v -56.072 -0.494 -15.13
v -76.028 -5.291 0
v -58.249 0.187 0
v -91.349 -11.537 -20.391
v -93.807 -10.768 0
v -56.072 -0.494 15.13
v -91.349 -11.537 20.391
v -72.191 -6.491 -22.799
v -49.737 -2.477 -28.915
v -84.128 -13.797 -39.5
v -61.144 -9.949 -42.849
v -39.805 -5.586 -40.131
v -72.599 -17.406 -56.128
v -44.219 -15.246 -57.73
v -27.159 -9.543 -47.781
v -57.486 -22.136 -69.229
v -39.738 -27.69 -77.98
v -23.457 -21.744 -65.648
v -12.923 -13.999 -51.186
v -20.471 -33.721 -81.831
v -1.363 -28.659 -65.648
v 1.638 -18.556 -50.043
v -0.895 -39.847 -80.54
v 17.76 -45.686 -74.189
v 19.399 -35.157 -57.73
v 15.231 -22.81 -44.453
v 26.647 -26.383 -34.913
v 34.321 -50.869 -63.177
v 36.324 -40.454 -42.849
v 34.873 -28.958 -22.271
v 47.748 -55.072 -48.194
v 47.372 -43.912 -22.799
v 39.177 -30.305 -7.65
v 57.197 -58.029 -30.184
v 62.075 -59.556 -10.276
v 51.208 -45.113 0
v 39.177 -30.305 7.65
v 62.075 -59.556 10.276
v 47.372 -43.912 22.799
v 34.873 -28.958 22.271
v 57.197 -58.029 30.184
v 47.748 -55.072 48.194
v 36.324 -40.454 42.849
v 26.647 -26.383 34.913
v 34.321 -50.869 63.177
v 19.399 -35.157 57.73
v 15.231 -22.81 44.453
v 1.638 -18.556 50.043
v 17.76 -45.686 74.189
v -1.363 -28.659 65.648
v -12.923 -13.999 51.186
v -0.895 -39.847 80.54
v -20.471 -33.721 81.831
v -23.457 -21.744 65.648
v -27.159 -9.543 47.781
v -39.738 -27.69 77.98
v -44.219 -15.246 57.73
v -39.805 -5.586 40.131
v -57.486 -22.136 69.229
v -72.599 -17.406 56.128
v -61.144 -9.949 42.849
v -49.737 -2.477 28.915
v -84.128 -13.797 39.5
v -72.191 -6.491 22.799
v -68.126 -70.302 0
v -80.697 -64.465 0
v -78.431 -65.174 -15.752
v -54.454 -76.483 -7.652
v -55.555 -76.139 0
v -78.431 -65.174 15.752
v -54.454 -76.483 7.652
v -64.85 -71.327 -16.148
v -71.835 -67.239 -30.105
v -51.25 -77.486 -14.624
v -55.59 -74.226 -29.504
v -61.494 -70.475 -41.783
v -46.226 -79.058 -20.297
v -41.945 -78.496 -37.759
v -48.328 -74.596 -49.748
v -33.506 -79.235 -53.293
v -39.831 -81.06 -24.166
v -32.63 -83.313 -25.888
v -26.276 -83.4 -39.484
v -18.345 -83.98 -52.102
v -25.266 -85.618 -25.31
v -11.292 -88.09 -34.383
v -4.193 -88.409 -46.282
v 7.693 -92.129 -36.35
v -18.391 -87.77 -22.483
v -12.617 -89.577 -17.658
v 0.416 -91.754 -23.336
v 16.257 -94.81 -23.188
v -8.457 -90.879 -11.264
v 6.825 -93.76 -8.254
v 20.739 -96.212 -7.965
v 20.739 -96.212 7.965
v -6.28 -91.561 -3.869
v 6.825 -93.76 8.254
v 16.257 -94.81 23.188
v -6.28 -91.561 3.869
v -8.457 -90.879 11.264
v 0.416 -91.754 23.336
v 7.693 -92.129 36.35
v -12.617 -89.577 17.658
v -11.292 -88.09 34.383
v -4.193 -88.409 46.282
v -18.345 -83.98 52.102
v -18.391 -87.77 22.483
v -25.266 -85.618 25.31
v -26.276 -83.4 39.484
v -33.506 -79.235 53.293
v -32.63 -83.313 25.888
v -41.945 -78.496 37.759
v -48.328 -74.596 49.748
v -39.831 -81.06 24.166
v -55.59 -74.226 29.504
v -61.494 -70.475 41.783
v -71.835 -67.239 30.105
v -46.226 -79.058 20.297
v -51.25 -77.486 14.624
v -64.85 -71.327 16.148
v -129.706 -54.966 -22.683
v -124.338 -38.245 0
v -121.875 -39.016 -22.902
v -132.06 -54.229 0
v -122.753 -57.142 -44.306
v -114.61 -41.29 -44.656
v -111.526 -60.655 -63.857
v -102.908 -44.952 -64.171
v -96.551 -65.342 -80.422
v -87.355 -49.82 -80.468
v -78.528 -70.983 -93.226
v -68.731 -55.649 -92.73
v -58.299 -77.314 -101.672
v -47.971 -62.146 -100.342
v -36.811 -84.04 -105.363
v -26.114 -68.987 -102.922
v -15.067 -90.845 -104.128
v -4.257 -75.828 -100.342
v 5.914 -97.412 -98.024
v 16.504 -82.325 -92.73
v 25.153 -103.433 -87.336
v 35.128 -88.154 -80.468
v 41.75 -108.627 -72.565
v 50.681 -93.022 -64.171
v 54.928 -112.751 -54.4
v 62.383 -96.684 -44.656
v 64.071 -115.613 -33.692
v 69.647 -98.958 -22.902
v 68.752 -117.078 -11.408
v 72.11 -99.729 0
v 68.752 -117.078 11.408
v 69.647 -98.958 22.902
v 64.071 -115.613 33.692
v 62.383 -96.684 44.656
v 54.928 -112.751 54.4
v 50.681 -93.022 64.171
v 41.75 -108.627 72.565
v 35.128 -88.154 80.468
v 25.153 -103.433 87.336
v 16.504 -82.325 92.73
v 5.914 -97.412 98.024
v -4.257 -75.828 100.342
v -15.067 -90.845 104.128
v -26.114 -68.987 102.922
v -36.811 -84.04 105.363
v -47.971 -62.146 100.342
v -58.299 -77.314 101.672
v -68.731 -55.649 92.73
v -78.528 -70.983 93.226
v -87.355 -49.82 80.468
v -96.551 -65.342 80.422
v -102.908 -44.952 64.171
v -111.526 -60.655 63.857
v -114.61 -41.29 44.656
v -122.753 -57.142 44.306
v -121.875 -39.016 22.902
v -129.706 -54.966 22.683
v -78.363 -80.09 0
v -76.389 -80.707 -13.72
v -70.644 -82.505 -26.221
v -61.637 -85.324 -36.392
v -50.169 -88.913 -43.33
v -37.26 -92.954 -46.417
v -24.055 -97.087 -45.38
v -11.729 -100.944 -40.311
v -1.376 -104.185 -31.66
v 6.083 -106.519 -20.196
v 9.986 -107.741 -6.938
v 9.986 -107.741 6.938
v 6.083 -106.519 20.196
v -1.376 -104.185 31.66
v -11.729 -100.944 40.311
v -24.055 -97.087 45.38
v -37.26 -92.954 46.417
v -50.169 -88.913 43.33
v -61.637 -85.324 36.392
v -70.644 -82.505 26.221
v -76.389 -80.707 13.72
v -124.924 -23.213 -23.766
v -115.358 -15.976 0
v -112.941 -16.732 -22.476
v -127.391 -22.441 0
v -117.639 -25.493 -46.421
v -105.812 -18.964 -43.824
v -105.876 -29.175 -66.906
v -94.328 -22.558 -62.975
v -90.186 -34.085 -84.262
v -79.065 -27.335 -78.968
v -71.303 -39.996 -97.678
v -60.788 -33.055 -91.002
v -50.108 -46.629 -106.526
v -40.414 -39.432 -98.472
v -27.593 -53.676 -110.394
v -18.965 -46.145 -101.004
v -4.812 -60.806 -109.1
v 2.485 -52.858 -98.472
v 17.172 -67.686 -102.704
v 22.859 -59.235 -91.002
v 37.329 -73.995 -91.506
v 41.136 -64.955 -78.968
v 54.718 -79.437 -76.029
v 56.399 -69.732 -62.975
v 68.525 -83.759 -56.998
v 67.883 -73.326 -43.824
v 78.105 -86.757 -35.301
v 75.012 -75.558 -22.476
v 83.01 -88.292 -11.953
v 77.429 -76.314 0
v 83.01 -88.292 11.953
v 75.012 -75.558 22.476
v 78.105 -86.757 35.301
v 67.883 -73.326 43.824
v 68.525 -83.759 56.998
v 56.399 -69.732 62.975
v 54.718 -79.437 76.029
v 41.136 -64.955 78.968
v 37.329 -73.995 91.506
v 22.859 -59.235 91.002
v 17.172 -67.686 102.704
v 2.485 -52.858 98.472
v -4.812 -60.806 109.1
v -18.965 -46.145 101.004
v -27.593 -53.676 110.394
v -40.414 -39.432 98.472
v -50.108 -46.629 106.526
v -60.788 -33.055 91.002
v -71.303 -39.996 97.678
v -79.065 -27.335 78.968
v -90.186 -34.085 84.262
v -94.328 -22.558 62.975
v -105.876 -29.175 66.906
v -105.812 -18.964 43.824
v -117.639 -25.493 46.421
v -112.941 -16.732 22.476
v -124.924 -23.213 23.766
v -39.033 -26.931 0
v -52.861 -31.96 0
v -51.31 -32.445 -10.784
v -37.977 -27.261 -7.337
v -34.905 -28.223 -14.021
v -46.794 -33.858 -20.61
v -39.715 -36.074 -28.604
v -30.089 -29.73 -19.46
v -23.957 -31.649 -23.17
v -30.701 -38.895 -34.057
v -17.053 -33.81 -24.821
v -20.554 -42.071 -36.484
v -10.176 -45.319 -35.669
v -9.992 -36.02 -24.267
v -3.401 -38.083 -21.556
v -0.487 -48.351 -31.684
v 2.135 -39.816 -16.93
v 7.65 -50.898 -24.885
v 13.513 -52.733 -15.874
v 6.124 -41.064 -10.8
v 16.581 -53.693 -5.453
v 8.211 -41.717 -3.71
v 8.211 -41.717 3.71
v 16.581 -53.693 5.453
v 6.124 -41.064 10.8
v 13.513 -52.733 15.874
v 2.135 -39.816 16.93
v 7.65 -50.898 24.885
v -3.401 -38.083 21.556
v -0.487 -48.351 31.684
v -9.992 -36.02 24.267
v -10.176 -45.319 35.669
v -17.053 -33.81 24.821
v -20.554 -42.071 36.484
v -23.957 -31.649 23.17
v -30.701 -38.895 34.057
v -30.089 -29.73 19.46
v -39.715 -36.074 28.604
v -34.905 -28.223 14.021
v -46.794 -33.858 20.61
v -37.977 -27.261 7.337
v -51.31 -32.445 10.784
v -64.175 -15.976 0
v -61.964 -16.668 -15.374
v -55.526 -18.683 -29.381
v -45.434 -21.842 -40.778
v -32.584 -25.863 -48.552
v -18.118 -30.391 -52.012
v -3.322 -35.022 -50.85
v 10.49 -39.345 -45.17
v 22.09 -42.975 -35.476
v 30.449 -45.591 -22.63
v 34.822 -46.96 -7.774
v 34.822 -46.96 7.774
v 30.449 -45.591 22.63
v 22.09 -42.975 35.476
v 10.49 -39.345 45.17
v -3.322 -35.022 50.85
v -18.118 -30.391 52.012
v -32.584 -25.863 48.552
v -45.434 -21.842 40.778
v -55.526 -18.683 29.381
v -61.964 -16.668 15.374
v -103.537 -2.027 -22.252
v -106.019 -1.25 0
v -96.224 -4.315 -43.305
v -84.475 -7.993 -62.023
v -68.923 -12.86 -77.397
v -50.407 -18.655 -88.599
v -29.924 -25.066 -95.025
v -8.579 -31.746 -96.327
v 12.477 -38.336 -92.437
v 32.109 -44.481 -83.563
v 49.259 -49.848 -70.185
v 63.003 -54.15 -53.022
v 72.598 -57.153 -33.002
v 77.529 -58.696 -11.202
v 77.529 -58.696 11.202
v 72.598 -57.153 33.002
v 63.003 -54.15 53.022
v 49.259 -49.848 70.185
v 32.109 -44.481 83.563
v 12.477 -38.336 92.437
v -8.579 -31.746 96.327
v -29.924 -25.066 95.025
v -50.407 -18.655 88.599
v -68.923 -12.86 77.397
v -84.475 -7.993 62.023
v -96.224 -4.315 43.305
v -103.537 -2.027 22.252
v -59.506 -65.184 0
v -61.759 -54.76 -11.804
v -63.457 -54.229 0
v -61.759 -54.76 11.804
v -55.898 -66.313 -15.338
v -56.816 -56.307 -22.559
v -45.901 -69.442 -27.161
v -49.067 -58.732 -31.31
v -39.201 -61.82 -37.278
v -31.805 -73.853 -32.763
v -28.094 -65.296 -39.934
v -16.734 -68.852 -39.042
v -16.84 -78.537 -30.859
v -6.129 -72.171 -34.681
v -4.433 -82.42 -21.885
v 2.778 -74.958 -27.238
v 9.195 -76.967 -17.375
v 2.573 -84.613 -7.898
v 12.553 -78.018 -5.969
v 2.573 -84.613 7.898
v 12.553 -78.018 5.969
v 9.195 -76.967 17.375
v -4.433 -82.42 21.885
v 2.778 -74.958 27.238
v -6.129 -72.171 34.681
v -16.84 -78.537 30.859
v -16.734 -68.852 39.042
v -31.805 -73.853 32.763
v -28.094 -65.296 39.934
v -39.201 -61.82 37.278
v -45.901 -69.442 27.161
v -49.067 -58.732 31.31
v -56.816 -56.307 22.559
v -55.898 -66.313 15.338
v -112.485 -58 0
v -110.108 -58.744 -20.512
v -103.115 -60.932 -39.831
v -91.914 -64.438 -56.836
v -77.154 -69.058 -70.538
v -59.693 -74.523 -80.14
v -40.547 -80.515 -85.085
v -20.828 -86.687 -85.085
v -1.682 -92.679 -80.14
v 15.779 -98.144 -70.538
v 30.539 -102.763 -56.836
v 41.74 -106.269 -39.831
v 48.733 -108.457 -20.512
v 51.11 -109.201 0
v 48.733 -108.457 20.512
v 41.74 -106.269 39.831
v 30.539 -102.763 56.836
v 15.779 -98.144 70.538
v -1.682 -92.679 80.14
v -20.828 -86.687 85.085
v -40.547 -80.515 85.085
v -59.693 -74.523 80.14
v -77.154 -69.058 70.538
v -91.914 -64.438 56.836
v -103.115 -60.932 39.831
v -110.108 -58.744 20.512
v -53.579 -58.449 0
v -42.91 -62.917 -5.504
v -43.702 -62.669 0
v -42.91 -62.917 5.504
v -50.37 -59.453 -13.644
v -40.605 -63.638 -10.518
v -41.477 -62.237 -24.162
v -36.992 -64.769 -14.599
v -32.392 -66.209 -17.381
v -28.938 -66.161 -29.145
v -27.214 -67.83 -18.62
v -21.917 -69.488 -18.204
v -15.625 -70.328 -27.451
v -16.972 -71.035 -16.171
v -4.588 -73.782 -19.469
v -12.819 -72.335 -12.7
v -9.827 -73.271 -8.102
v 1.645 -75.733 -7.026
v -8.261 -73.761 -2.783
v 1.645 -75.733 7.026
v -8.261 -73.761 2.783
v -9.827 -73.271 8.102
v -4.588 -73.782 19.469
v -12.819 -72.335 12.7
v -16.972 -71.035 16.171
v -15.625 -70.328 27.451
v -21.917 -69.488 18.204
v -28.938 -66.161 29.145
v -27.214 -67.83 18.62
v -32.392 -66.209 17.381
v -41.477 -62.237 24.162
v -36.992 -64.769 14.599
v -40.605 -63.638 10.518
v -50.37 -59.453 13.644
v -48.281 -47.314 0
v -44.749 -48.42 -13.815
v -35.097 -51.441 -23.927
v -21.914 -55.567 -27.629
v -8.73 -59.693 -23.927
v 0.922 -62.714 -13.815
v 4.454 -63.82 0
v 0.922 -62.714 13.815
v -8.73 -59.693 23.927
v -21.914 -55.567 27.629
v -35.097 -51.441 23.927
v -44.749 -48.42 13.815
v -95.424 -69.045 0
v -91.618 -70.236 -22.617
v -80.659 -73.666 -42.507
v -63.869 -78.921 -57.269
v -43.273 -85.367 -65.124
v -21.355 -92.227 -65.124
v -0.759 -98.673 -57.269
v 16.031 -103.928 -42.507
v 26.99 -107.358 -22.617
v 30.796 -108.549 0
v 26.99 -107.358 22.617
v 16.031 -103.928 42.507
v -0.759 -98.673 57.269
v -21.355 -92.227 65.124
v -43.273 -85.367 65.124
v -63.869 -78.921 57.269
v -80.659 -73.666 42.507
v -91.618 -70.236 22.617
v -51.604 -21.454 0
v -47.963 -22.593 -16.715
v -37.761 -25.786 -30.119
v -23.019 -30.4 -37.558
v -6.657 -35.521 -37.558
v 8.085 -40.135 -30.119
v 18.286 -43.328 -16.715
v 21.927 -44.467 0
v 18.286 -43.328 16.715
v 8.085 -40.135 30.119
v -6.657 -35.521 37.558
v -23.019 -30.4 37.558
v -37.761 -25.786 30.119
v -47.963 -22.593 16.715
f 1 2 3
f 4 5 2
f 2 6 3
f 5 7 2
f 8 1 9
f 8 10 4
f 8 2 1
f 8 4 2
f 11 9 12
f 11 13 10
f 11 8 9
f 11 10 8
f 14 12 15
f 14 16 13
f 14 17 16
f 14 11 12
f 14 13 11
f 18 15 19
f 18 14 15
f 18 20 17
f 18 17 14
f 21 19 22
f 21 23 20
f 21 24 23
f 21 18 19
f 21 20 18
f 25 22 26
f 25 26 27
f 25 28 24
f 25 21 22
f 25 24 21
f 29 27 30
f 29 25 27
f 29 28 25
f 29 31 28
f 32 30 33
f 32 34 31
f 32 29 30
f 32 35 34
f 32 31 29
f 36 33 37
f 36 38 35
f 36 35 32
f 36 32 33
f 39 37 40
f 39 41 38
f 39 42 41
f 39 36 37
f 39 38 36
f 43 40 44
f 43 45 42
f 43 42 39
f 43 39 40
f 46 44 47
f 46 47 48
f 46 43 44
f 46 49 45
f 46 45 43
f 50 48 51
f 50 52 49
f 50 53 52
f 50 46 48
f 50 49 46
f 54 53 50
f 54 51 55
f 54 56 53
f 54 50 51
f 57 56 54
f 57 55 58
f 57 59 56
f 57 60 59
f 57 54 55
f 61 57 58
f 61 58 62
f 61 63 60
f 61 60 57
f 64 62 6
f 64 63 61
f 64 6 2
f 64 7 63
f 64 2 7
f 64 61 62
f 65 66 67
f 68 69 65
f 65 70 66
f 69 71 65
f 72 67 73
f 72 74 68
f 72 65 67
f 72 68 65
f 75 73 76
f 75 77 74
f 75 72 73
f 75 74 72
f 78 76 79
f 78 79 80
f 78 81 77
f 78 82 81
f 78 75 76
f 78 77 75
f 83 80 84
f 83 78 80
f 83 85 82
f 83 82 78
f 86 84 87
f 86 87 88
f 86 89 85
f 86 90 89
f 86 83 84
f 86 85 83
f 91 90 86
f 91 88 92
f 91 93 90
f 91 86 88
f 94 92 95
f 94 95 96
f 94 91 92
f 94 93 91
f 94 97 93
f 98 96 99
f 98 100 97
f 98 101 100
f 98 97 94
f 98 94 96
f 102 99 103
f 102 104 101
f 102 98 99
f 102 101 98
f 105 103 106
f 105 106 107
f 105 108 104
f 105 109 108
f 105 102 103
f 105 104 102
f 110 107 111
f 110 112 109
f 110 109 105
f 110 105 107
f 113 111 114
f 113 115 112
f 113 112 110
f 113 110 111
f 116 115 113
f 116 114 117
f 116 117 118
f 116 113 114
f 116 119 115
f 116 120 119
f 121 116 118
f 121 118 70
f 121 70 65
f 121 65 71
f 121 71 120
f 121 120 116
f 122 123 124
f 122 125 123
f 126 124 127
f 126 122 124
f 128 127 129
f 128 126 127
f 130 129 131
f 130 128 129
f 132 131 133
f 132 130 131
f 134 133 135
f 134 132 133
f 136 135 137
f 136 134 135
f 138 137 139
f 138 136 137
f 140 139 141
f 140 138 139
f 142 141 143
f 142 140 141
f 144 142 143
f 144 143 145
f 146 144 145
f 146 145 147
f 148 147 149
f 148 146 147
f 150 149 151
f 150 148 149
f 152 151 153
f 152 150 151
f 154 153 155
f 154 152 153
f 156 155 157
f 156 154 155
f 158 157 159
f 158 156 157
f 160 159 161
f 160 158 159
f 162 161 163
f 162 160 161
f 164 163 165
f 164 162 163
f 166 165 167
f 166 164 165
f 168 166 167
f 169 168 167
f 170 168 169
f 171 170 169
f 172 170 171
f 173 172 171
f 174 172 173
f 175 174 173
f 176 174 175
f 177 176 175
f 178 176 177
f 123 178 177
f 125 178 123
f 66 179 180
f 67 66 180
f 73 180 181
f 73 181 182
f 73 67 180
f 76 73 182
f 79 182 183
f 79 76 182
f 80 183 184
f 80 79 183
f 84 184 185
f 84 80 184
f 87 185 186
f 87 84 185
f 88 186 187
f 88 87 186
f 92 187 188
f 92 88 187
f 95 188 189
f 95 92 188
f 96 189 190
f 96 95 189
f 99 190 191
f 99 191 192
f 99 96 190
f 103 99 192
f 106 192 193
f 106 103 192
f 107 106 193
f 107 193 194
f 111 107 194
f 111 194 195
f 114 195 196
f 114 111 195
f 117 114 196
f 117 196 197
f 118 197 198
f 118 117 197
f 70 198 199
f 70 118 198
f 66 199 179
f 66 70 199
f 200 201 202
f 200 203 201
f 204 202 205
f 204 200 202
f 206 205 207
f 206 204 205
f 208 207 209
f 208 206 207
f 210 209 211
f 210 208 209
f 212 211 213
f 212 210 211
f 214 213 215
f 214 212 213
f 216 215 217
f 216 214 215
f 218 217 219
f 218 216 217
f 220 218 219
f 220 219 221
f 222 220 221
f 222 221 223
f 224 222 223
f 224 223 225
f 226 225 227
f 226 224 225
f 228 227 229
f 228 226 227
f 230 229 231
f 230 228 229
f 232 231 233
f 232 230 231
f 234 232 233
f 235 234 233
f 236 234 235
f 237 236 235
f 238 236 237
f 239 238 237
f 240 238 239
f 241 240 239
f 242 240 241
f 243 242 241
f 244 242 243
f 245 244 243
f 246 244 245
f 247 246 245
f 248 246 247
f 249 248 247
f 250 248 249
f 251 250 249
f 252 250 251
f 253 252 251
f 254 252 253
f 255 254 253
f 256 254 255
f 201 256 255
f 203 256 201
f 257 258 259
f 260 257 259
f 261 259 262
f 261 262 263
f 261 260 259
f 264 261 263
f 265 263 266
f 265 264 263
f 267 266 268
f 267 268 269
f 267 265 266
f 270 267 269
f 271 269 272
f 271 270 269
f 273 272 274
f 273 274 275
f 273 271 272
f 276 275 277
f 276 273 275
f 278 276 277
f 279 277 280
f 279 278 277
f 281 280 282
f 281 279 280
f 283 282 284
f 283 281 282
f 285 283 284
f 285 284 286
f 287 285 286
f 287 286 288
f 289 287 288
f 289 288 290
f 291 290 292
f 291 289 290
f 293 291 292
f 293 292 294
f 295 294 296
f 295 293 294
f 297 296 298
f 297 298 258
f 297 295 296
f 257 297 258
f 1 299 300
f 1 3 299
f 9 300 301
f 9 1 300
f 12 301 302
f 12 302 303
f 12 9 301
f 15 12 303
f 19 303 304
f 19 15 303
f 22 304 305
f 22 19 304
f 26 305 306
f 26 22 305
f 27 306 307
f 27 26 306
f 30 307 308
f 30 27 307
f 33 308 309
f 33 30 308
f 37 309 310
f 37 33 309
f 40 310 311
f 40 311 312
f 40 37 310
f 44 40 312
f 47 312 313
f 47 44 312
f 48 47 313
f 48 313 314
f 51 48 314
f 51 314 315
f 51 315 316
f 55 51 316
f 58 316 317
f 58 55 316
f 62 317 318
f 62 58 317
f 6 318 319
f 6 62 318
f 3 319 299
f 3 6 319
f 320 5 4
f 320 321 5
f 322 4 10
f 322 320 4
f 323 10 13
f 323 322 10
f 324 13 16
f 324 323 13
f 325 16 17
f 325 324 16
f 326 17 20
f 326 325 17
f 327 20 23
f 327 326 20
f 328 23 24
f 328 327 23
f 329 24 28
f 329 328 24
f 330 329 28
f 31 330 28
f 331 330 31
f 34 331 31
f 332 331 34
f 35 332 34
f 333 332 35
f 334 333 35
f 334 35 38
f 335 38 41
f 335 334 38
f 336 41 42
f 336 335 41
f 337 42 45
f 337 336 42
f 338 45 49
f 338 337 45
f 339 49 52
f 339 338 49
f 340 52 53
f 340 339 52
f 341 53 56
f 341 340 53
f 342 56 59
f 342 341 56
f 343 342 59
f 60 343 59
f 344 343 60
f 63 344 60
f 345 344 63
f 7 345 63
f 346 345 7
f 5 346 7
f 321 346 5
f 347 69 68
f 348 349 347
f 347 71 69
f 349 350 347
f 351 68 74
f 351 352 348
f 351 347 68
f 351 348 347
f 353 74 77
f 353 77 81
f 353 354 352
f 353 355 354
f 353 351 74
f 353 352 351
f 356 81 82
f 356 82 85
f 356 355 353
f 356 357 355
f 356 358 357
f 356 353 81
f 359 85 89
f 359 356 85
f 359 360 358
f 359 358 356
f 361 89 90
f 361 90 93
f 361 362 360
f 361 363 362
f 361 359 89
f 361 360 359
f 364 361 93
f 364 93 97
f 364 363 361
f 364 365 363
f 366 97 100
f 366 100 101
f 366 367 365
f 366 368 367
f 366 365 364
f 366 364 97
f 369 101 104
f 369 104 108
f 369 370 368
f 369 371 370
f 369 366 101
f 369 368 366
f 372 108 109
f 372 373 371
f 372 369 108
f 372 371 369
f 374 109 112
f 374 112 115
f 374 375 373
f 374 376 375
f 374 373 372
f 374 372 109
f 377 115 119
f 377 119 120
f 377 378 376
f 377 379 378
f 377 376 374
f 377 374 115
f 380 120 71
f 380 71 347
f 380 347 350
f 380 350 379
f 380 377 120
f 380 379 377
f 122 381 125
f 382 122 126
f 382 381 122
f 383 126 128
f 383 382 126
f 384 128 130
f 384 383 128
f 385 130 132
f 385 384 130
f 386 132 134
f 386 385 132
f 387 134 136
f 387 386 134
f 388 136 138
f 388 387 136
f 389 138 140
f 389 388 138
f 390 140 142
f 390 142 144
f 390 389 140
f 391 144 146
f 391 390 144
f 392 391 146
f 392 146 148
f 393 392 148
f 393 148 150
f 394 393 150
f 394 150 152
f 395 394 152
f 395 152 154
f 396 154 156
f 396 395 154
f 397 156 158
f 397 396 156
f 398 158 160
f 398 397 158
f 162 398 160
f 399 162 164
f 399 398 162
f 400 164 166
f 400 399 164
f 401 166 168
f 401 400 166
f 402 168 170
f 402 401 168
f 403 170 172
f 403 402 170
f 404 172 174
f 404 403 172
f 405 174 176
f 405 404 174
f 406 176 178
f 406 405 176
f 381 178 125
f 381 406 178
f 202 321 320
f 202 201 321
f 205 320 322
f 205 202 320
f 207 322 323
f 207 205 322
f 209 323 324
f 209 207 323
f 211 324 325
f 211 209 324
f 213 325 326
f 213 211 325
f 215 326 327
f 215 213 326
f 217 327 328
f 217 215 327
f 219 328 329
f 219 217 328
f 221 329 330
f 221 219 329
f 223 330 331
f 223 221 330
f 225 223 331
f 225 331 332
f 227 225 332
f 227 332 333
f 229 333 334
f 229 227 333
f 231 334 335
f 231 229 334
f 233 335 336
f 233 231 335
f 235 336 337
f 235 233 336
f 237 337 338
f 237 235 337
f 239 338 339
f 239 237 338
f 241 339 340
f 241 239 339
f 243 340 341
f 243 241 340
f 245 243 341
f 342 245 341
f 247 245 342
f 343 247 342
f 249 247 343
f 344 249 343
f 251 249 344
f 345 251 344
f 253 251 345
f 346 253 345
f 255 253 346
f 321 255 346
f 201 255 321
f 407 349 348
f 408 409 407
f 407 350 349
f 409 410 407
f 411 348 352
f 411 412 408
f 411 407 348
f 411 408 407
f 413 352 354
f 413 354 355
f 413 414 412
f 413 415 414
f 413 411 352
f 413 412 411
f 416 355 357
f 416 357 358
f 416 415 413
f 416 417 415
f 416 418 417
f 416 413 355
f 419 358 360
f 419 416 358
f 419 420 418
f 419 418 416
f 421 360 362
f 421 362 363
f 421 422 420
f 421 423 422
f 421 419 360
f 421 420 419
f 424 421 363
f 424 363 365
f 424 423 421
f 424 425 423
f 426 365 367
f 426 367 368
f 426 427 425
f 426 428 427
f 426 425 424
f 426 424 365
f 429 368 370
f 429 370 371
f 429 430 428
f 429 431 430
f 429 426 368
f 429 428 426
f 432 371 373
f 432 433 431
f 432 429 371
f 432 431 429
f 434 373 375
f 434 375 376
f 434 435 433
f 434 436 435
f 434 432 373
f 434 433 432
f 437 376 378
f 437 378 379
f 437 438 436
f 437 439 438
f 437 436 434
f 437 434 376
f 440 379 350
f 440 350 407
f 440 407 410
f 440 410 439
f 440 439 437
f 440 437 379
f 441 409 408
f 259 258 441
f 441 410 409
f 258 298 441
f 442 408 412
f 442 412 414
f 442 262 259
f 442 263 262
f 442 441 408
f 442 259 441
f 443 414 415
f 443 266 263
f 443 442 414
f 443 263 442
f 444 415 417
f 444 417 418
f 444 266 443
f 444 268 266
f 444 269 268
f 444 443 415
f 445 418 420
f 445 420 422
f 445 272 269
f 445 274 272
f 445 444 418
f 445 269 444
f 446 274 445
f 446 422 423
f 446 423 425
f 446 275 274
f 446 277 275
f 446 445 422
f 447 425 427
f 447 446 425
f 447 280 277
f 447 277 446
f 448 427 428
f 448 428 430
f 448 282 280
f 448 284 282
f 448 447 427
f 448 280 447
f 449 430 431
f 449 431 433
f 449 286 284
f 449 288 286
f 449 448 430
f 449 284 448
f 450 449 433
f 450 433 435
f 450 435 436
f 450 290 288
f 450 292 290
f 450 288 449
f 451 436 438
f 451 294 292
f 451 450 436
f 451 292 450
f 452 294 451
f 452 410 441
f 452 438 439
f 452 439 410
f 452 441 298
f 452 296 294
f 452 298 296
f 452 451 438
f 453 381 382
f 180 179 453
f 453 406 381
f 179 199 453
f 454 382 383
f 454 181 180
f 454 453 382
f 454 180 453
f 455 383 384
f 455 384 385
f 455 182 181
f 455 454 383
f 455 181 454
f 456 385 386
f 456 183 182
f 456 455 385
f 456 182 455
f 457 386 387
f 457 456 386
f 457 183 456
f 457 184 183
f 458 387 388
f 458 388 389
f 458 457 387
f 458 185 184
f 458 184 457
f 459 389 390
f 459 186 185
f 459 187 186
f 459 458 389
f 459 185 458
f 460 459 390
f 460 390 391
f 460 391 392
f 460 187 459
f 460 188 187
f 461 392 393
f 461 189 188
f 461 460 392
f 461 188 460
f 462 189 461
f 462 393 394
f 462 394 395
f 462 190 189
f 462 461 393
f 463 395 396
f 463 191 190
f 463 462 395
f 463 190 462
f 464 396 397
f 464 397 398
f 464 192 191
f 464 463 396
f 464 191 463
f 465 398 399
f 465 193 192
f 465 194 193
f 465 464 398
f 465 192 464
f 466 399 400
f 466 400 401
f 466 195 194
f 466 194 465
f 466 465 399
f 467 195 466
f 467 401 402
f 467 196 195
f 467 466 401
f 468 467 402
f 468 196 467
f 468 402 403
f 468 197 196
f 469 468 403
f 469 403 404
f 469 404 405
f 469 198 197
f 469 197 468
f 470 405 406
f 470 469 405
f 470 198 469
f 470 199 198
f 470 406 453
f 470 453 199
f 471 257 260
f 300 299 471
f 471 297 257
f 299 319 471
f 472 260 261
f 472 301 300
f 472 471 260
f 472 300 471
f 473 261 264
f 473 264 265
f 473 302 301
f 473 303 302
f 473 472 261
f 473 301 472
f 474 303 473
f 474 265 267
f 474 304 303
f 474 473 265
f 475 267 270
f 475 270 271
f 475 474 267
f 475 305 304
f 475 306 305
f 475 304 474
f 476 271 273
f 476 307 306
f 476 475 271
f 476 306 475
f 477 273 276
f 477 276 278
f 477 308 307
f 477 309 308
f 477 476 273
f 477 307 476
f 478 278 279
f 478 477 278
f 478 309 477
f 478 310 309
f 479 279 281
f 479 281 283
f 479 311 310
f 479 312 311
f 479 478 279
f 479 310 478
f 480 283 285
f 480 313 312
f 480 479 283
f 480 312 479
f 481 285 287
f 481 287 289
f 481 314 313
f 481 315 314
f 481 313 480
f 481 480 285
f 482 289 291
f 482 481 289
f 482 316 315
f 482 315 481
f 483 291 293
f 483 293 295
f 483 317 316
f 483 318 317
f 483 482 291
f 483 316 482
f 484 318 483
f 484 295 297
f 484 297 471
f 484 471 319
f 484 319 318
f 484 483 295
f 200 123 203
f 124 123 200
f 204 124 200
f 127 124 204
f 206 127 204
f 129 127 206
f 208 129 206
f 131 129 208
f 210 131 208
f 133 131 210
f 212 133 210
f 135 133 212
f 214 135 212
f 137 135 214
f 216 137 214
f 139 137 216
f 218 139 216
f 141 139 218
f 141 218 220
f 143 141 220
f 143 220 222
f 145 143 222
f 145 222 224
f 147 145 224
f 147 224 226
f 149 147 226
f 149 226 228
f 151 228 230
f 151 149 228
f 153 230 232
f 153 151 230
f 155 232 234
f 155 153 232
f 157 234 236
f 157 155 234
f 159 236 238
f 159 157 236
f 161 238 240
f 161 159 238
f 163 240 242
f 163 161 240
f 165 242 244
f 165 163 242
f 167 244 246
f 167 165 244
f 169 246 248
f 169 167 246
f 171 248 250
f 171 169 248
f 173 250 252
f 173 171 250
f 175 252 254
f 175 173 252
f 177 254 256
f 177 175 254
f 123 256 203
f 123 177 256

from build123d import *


with BuildPart() as f1:
    # F0 (on Top) → F1 (revolve)
    with BuildSketch(Plane.XY):
        Polygon((-115.35806, -15.976095), (-127.390557, -22.441317), (-124.337537, -38.245195), (-132.059885, -54.228663), (-112.484628, -58.000044), (-78.36262, -80.089555), (-80.697283, -64.465263), (-55.554753, -76.138583), (-63.456689, -54.228663), (-43.70184, -62.66937), (-52.86091, -31.959562), (-39.032516, -26.931056), (-64.175046, -15.976095), (-58.248594, 0.18696), (-93.807319, -10.767997), (-106.019405, -1.249754), align=None)
    revolve(axis=Axis((-21.009779, -52.6792, 0), (-0.29869, -0.95435, 0)))


solid = f1.part
